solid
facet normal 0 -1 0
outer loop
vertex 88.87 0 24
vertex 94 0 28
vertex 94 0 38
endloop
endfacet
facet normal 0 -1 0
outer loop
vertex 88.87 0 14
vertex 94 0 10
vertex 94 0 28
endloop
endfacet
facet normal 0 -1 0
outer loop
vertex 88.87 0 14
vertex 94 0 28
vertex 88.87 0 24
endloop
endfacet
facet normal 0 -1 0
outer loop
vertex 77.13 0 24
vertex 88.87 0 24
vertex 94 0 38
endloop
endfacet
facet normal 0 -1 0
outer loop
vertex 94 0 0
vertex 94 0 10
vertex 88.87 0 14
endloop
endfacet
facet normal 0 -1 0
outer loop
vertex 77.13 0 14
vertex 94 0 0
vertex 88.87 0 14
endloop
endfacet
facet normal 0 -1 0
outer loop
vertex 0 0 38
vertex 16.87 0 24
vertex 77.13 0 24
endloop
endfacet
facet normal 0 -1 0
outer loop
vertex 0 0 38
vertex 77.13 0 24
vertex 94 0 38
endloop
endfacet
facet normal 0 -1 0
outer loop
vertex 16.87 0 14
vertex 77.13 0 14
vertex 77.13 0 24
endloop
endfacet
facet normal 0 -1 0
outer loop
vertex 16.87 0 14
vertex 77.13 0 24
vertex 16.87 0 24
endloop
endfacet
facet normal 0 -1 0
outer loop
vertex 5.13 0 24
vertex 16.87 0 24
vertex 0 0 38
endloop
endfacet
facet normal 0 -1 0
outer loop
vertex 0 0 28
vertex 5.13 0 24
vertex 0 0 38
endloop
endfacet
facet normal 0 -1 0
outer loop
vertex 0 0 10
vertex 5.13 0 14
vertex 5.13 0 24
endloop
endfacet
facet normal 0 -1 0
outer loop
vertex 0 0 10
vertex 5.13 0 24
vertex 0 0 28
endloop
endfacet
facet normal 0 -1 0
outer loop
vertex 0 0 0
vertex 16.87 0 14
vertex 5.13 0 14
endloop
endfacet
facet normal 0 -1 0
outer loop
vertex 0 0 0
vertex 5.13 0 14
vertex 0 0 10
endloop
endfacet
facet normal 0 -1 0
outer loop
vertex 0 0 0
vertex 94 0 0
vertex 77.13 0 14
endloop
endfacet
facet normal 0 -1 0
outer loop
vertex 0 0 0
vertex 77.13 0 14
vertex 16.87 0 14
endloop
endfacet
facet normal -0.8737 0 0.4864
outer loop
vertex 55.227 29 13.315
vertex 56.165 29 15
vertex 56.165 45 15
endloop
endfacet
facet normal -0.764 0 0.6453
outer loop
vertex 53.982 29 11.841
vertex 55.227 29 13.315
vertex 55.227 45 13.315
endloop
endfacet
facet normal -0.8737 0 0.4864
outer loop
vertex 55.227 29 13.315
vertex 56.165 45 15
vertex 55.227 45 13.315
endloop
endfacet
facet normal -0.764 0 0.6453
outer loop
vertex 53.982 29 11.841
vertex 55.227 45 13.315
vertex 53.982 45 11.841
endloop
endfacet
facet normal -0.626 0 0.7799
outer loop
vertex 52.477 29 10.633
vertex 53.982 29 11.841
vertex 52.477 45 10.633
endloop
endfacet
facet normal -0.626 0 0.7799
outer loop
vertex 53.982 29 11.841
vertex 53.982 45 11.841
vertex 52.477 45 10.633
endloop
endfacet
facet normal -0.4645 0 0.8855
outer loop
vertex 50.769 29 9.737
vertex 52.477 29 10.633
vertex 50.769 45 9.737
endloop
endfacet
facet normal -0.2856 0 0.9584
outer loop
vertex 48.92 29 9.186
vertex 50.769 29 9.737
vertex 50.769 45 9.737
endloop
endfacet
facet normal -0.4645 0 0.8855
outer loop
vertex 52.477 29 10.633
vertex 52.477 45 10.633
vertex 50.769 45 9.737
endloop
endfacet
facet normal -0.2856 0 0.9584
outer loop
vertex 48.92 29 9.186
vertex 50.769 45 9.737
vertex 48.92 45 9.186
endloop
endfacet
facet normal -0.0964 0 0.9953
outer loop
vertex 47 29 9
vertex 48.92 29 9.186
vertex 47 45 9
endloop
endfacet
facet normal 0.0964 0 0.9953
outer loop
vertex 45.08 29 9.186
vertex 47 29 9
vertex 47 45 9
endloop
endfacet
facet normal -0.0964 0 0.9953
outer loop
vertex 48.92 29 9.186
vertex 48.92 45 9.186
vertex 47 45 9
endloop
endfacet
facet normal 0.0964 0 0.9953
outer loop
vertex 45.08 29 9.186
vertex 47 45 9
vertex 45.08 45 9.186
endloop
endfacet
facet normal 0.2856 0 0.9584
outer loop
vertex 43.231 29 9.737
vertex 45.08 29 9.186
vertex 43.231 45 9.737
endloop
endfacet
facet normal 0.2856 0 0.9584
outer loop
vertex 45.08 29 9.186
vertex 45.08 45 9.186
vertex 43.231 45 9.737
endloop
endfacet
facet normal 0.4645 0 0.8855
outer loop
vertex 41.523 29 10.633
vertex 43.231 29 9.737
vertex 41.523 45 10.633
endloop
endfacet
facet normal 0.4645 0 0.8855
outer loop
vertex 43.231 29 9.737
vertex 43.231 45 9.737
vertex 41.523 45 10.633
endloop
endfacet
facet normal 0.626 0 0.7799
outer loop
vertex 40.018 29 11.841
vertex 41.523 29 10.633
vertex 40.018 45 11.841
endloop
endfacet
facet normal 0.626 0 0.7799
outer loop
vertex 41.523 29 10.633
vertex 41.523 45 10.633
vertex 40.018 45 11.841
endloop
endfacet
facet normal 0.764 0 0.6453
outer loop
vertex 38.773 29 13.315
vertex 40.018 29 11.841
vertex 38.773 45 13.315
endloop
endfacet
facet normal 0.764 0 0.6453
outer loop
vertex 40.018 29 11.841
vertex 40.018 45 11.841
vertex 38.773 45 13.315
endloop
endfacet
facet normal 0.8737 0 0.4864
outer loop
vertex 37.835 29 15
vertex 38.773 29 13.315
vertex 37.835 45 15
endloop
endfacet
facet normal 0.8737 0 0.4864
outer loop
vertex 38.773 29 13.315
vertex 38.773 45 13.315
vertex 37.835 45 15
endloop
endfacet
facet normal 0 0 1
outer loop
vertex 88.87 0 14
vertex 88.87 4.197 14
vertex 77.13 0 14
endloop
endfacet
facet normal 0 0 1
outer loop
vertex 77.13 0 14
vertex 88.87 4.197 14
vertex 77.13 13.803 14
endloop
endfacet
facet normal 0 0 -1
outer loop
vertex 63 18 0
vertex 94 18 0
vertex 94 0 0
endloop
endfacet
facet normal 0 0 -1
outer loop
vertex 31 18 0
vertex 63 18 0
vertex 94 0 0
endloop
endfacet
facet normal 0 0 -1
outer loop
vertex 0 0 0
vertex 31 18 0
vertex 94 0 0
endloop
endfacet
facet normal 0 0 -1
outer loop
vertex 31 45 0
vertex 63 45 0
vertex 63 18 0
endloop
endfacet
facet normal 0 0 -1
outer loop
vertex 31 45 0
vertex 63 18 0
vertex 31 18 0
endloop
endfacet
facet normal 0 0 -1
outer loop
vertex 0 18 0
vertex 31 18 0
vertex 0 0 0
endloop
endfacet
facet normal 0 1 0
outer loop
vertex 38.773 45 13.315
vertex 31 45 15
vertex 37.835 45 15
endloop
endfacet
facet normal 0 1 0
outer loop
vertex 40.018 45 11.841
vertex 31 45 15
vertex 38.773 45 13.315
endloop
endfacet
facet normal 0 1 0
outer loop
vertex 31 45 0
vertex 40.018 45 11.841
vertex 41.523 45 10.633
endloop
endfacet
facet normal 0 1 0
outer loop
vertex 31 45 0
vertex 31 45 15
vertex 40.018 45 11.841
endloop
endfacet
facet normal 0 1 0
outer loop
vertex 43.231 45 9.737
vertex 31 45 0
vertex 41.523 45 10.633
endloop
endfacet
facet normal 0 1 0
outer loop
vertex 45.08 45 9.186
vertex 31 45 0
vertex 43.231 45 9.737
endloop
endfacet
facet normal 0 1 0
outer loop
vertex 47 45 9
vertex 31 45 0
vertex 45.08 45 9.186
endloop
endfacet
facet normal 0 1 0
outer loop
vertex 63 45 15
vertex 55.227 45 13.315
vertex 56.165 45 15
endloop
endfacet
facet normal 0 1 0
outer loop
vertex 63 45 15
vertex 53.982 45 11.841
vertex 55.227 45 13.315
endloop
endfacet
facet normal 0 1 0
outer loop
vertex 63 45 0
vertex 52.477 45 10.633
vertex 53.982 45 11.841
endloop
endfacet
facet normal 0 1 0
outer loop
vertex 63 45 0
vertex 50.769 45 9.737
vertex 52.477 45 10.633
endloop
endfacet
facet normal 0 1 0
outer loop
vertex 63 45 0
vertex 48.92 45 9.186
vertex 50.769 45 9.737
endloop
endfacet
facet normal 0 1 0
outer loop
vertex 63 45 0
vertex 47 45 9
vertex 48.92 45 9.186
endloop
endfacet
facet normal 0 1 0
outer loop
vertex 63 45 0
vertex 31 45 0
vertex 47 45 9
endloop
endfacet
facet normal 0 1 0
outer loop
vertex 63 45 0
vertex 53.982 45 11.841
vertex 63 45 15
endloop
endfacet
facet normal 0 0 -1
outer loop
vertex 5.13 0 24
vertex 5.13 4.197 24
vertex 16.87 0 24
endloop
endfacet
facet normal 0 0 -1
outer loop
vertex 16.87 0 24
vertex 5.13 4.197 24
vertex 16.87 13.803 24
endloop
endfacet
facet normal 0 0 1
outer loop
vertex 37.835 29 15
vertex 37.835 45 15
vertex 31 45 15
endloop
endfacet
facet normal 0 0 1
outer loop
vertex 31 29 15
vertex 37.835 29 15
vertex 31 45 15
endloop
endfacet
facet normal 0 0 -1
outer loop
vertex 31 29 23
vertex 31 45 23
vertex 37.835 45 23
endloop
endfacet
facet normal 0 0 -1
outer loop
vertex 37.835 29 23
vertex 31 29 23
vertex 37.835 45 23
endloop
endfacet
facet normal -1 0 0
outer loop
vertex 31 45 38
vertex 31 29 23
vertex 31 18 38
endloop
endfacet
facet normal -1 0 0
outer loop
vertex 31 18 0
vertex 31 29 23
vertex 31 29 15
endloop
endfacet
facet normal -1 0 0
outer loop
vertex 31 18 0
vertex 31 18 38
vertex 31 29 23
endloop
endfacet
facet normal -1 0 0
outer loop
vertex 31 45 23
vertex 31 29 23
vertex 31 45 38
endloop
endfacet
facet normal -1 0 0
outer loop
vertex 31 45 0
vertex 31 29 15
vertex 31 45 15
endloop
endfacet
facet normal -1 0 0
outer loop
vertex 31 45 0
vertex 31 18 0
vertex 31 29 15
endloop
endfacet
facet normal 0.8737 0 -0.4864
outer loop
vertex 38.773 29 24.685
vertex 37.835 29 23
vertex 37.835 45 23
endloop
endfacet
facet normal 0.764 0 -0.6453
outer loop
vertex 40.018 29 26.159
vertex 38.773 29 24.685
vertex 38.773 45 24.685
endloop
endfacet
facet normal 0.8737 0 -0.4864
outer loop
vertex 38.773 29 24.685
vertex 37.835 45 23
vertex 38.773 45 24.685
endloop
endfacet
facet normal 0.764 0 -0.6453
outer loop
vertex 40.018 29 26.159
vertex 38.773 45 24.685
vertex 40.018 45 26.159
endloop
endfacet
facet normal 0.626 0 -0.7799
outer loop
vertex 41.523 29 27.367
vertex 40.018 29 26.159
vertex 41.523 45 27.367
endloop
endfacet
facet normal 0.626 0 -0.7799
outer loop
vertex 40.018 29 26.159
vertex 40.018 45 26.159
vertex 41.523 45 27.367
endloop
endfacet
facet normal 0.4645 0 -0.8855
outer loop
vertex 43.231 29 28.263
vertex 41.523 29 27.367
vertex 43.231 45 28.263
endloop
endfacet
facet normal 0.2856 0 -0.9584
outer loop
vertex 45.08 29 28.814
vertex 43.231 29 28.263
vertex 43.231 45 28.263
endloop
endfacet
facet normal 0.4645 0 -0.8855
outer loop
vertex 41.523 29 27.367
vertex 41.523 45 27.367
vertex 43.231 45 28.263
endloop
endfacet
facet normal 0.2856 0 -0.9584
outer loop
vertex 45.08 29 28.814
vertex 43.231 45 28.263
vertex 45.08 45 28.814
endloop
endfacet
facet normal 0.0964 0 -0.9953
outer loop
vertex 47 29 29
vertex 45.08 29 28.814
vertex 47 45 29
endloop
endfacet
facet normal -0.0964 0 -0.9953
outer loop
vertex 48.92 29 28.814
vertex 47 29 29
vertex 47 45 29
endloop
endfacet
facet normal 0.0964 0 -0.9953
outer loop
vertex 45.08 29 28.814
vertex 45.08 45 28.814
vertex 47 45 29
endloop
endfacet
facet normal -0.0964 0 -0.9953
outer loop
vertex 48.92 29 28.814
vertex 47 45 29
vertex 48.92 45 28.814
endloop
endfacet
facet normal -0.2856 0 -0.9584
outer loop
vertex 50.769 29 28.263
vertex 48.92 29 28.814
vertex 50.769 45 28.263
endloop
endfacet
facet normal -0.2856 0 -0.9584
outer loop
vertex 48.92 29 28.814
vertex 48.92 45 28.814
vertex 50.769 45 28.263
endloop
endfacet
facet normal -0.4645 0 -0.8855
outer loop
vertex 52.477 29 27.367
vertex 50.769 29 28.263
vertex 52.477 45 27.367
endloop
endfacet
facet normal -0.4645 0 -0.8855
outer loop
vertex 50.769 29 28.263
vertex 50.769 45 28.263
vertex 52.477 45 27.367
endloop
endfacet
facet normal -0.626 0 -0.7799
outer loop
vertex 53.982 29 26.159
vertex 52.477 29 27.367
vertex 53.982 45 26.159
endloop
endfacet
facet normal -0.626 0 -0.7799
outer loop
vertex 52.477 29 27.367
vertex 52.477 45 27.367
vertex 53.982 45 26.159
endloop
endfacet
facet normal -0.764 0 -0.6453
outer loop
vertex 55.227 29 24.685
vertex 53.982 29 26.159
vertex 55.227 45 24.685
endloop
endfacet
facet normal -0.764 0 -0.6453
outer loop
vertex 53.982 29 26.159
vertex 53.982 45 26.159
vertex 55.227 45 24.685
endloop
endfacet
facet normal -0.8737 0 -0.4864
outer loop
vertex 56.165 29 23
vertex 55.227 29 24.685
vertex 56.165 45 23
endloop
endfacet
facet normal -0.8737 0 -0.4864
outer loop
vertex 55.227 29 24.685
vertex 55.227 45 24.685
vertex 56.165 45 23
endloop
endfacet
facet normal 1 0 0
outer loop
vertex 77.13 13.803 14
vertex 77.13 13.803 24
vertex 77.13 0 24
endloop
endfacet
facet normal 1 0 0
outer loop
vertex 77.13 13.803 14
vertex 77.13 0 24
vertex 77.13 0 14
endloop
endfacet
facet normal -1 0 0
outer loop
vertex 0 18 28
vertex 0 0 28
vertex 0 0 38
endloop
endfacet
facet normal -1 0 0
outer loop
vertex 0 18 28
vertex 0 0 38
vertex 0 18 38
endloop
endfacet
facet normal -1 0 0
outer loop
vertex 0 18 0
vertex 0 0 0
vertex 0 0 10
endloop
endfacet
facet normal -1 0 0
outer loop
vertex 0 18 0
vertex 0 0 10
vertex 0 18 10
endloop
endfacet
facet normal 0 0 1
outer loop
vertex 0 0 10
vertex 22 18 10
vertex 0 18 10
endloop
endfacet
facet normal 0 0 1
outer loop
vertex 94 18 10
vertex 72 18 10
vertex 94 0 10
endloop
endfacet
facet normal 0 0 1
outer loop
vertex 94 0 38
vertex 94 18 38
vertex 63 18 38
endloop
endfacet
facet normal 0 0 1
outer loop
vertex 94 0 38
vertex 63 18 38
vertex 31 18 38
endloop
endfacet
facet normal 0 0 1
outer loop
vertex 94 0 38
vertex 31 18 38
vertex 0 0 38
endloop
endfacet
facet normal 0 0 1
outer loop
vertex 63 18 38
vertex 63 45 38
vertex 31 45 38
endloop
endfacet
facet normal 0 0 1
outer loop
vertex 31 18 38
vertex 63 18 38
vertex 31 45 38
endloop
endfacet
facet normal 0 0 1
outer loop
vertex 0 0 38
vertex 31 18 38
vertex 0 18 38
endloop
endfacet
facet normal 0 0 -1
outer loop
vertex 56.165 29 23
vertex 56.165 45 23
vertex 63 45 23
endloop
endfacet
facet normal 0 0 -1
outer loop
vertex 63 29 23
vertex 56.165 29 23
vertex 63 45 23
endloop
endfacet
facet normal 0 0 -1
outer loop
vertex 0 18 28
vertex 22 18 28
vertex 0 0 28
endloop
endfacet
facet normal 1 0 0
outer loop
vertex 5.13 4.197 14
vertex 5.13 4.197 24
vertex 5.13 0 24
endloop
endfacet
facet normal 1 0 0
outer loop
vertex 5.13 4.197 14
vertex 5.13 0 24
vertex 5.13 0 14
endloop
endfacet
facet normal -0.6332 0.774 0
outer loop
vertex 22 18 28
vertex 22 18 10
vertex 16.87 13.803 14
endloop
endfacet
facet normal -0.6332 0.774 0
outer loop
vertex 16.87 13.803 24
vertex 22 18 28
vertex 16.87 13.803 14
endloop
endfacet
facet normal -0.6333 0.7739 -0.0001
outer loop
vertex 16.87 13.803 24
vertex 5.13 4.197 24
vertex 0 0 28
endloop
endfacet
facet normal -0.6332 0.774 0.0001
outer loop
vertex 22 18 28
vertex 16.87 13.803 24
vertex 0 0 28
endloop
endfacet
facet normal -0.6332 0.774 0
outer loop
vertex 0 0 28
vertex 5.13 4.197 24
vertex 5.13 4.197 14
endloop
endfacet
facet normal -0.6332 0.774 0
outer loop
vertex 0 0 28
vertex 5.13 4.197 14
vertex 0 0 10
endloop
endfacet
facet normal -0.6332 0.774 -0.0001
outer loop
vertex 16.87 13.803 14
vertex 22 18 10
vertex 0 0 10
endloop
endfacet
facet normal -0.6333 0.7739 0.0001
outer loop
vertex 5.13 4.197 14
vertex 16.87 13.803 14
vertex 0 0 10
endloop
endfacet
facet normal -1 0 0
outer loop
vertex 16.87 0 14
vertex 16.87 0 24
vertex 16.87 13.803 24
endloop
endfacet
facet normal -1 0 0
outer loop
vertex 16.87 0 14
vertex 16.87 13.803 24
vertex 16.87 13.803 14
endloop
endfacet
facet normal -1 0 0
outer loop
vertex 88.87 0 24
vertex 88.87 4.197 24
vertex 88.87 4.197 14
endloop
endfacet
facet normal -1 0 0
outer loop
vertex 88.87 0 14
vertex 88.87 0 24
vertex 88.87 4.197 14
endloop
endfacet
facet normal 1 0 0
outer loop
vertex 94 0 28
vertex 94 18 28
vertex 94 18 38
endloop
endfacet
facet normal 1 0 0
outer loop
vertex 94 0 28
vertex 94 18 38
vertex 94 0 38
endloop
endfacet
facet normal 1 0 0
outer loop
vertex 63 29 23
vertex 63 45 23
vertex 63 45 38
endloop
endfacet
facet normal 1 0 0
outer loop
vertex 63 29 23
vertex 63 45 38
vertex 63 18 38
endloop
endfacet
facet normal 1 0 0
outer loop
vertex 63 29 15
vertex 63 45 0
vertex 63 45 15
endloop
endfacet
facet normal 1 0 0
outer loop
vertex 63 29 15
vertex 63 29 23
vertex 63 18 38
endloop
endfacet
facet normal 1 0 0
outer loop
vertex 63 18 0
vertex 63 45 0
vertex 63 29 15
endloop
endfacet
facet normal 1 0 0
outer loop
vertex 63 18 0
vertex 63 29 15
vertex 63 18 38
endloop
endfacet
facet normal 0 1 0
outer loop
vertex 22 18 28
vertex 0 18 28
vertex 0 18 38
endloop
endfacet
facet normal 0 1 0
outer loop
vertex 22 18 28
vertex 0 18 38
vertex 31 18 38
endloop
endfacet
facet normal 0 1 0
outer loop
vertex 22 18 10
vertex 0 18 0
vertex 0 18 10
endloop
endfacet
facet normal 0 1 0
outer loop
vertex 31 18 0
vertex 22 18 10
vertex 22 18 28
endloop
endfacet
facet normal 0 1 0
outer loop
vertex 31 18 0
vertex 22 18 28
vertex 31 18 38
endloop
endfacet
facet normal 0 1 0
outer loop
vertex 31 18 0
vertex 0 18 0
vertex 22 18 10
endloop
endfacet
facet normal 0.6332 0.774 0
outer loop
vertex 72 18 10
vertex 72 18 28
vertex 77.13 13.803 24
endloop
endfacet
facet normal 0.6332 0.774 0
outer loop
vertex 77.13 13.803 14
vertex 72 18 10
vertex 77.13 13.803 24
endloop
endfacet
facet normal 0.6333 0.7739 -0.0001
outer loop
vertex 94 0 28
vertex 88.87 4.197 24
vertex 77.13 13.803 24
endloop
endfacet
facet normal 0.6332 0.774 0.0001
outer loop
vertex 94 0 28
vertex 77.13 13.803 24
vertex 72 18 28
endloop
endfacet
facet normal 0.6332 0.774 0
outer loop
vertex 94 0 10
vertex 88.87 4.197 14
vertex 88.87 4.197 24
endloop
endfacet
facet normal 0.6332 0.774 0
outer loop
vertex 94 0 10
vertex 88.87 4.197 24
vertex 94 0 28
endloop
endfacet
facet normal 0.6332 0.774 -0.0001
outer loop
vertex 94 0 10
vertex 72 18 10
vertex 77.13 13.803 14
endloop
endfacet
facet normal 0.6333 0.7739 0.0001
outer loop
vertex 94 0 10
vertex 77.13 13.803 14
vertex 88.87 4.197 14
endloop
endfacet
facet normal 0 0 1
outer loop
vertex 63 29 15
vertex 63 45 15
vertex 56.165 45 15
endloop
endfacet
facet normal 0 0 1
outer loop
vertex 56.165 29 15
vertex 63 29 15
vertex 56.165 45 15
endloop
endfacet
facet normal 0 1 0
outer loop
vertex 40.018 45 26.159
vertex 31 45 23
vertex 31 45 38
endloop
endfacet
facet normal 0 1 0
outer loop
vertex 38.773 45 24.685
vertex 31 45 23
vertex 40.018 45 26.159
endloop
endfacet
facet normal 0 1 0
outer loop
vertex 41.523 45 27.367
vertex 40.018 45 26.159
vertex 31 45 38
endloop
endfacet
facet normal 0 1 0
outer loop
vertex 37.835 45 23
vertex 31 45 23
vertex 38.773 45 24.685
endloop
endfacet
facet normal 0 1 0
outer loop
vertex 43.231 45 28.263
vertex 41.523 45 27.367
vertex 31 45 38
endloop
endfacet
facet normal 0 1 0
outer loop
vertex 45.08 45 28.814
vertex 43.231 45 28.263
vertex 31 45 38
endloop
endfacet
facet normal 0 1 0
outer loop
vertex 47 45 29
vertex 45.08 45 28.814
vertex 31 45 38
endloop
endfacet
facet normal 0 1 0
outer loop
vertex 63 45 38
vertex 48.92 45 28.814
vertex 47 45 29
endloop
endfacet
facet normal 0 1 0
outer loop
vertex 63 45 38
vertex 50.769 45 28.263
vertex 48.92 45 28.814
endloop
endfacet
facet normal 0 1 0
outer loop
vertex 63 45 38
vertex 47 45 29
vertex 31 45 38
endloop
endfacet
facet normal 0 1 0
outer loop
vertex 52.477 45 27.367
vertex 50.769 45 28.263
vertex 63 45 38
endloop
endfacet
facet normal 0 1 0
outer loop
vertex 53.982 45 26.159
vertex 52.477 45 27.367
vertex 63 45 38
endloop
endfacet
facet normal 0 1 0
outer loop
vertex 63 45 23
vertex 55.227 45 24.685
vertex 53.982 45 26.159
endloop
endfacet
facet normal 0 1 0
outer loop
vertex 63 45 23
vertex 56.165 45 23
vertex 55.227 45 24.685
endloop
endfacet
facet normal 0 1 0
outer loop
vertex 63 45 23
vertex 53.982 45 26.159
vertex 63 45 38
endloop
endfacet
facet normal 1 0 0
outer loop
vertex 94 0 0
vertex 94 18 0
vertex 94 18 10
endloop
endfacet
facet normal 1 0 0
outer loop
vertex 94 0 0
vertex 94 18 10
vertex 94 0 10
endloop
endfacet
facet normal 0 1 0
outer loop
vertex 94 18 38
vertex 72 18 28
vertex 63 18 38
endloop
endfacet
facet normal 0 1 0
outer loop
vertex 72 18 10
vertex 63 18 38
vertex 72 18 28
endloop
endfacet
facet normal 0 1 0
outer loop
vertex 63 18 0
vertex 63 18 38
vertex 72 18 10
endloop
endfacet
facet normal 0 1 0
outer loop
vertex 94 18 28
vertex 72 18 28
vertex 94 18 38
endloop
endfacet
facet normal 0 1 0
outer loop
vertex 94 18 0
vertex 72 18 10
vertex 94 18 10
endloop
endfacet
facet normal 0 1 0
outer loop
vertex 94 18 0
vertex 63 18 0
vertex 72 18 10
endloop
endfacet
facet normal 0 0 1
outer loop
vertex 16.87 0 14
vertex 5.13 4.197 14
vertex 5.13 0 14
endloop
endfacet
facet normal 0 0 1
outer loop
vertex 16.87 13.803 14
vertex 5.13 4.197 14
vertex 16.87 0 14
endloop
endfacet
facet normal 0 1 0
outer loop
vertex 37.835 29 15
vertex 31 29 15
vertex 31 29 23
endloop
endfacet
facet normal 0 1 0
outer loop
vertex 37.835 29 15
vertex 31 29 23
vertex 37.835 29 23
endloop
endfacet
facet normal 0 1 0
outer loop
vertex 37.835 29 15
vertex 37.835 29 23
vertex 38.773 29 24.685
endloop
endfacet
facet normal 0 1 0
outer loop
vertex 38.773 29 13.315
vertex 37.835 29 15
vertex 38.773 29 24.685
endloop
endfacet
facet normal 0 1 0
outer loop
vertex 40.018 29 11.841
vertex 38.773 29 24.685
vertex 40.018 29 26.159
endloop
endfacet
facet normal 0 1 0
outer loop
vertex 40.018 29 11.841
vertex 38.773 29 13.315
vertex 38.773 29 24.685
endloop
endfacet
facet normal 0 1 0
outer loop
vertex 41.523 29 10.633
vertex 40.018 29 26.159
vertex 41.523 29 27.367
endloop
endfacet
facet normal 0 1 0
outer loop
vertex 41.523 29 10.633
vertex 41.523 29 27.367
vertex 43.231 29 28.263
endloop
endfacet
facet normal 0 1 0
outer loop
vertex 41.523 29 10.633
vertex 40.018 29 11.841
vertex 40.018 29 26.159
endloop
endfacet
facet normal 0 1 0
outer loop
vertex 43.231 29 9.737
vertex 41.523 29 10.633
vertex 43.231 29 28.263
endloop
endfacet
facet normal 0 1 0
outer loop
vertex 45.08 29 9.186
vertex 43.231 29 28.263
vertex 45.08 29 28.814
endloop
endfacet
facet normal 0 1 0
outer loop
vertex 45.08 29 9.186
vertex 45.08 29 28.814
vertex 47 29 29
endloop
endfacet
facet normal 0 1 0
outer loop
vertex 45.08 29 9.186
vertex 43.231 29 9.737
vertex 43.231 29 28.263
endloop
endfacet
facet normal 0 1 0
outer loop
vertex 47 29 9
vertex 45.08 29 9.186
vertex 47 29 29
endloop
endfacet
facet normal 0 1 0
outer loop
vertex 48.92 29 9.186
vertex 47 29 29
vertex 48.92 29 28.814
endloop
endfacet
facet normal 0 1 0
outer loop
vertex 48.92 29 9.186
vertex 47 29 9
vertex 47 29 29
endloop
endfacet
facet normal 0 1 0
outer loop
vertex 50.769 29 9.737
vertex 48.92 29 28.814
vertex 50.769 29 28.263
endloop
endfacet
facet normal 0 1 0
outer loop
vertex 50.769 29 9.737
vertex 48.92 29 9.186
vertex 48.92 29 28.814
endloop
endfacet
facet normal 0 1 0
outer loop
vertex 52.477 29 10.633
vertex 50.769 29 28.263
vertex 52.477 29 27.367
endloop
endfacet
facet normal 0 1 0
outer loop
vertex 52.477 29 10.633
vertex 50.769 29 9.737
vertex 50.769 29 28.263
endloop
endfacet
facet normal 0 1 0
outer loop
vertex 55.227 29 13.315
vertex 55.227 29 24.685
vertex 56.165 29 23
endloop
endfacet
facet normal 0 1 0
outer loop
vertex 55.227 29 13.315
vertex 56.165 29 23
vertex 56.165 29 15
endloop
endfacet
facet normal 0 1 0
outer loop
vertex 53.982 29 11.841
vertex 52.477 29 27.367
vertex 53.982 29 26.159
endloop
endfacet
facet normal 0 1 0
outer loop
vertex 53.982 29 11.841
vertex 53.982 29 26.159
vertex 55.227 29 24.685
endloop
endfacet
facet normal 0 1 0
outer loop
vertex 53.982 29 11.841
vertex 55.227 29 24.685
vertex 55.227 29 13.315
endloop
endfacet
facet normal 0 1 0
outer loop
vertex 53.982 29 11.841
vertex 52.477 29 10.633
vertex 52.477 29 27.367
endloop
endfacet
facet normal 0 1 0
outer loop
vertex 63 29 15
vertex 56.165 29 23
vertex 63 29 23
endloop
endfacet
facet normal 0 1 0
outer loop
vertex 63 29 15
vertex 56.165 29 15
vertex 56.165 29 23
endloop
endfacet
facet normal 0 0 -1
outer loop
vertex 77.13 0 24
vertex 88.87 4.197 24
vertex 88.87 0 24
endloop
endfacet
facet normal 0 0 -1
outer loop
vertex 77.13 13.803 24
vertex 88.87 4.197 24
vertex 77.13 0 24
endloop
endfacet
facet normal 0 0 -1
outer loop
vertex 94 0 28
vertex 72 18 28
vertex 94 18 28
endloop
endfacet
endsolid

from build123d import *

# Parameters (mm, degrees)
BOSS_EXTRUDE1_DEPTH = 38
CUT_EXTRUDE1_DEPTH  = 16
SKETCH4_W           = 28.425340807
SKETCH4_H           = 18
CUT_EXTRUDE2_DEPTH  = 46
SKETCH5_W           = 11.74
SKETCH5_H           = 10
CUT_EXTRUDE3_DEPTH  = 76


with BuildPart() as part:
    # Sketch1 → Boss-Extrude1 (new body)
    with BuildSketch(Plane.XY):
        Polygon((0, 0), (0, 18), (31, 18), (31, 45), (63, 45), (63, 18), (94, 18), (94, 0), align=None)
    extrude(amount=BOSS_EXTRUDE1_DEPTH)

    # Sketch2 → Cut-Extrude1 (cut)
    with BuildSketch(Plane(origin=(0, 45, 0), x_dir=(1, 0, 0), z_dir=(0, 1, 0))):
        with BuildLine():
            Line((63, -23), (63, -15))
            Line((63, -15), (56.16515139, -15))
            ThreePointArc((56.16515139, -15), (47, -9), (37.83484861, -15))
            Line((37.83484861, -15), (31, -15))
            Line((31, -15), (31, -23))
            Line((31, -23), (37.83484861, -23))
            ThreePointArc((37.83484861, -23), (47, -29), (56.16515139, -23))
            Line((56.16515139, -23), (63, -23))
        make_face()
    extrude(amount=-CUT_EXTRUDE1_DEPTH, mode=Mode.SUBTRACT)

    # Sketch4 → Cut-Extrude2 (cut)
    with BuildSketch(Plane(origin=(0, 0, 0), x_dir=(-0.773957299203321, -0.6332377902572627, 0), z_dir=(0.6332377902572627, -0.773957299203321, 0))):
        with Locations((-14.212670404, -19)):
            Rectangle(SKETCH4_W, SKETCH4_H)
    cut_extrude2 = extrude(amount=-CUT_EXTRUDE2_DEPTH, mode=Mode.SUBTRACT)

    # Sketch5 → Cut-Extrude3 (cut)
    with BuildSketch(Plane(origin=(0, 18, 0), x_dir=(1, 0, 0), z_dir=(0, 1, 0))):
        with Locations((11, -19)):
            Rectangle(SKETCH5_W, SKETCH5_H)
    cut_extrude3 = extrude(amount=-CUT_EXTRUDE3_DEPTH, mode=Mode.SUBTRACT)

    # Mirror1: Cut-Extrude2, Cut-Extrude3 across plane
    add(cut_extrude2.mirror(Plane(origin=(47, 0, 0), x_dir=(0, 0, 1), z_dir=(1, 0, 0))), mode=Mode.SUBTRACT)
    add(cut_extrude3.mirror(Plane(origin=(47, 0, 0), x_dir=(0, 0, 1), z_dir=(1, 0, 0))), mode=Mode.SUBTRACT)


solid = part.part
